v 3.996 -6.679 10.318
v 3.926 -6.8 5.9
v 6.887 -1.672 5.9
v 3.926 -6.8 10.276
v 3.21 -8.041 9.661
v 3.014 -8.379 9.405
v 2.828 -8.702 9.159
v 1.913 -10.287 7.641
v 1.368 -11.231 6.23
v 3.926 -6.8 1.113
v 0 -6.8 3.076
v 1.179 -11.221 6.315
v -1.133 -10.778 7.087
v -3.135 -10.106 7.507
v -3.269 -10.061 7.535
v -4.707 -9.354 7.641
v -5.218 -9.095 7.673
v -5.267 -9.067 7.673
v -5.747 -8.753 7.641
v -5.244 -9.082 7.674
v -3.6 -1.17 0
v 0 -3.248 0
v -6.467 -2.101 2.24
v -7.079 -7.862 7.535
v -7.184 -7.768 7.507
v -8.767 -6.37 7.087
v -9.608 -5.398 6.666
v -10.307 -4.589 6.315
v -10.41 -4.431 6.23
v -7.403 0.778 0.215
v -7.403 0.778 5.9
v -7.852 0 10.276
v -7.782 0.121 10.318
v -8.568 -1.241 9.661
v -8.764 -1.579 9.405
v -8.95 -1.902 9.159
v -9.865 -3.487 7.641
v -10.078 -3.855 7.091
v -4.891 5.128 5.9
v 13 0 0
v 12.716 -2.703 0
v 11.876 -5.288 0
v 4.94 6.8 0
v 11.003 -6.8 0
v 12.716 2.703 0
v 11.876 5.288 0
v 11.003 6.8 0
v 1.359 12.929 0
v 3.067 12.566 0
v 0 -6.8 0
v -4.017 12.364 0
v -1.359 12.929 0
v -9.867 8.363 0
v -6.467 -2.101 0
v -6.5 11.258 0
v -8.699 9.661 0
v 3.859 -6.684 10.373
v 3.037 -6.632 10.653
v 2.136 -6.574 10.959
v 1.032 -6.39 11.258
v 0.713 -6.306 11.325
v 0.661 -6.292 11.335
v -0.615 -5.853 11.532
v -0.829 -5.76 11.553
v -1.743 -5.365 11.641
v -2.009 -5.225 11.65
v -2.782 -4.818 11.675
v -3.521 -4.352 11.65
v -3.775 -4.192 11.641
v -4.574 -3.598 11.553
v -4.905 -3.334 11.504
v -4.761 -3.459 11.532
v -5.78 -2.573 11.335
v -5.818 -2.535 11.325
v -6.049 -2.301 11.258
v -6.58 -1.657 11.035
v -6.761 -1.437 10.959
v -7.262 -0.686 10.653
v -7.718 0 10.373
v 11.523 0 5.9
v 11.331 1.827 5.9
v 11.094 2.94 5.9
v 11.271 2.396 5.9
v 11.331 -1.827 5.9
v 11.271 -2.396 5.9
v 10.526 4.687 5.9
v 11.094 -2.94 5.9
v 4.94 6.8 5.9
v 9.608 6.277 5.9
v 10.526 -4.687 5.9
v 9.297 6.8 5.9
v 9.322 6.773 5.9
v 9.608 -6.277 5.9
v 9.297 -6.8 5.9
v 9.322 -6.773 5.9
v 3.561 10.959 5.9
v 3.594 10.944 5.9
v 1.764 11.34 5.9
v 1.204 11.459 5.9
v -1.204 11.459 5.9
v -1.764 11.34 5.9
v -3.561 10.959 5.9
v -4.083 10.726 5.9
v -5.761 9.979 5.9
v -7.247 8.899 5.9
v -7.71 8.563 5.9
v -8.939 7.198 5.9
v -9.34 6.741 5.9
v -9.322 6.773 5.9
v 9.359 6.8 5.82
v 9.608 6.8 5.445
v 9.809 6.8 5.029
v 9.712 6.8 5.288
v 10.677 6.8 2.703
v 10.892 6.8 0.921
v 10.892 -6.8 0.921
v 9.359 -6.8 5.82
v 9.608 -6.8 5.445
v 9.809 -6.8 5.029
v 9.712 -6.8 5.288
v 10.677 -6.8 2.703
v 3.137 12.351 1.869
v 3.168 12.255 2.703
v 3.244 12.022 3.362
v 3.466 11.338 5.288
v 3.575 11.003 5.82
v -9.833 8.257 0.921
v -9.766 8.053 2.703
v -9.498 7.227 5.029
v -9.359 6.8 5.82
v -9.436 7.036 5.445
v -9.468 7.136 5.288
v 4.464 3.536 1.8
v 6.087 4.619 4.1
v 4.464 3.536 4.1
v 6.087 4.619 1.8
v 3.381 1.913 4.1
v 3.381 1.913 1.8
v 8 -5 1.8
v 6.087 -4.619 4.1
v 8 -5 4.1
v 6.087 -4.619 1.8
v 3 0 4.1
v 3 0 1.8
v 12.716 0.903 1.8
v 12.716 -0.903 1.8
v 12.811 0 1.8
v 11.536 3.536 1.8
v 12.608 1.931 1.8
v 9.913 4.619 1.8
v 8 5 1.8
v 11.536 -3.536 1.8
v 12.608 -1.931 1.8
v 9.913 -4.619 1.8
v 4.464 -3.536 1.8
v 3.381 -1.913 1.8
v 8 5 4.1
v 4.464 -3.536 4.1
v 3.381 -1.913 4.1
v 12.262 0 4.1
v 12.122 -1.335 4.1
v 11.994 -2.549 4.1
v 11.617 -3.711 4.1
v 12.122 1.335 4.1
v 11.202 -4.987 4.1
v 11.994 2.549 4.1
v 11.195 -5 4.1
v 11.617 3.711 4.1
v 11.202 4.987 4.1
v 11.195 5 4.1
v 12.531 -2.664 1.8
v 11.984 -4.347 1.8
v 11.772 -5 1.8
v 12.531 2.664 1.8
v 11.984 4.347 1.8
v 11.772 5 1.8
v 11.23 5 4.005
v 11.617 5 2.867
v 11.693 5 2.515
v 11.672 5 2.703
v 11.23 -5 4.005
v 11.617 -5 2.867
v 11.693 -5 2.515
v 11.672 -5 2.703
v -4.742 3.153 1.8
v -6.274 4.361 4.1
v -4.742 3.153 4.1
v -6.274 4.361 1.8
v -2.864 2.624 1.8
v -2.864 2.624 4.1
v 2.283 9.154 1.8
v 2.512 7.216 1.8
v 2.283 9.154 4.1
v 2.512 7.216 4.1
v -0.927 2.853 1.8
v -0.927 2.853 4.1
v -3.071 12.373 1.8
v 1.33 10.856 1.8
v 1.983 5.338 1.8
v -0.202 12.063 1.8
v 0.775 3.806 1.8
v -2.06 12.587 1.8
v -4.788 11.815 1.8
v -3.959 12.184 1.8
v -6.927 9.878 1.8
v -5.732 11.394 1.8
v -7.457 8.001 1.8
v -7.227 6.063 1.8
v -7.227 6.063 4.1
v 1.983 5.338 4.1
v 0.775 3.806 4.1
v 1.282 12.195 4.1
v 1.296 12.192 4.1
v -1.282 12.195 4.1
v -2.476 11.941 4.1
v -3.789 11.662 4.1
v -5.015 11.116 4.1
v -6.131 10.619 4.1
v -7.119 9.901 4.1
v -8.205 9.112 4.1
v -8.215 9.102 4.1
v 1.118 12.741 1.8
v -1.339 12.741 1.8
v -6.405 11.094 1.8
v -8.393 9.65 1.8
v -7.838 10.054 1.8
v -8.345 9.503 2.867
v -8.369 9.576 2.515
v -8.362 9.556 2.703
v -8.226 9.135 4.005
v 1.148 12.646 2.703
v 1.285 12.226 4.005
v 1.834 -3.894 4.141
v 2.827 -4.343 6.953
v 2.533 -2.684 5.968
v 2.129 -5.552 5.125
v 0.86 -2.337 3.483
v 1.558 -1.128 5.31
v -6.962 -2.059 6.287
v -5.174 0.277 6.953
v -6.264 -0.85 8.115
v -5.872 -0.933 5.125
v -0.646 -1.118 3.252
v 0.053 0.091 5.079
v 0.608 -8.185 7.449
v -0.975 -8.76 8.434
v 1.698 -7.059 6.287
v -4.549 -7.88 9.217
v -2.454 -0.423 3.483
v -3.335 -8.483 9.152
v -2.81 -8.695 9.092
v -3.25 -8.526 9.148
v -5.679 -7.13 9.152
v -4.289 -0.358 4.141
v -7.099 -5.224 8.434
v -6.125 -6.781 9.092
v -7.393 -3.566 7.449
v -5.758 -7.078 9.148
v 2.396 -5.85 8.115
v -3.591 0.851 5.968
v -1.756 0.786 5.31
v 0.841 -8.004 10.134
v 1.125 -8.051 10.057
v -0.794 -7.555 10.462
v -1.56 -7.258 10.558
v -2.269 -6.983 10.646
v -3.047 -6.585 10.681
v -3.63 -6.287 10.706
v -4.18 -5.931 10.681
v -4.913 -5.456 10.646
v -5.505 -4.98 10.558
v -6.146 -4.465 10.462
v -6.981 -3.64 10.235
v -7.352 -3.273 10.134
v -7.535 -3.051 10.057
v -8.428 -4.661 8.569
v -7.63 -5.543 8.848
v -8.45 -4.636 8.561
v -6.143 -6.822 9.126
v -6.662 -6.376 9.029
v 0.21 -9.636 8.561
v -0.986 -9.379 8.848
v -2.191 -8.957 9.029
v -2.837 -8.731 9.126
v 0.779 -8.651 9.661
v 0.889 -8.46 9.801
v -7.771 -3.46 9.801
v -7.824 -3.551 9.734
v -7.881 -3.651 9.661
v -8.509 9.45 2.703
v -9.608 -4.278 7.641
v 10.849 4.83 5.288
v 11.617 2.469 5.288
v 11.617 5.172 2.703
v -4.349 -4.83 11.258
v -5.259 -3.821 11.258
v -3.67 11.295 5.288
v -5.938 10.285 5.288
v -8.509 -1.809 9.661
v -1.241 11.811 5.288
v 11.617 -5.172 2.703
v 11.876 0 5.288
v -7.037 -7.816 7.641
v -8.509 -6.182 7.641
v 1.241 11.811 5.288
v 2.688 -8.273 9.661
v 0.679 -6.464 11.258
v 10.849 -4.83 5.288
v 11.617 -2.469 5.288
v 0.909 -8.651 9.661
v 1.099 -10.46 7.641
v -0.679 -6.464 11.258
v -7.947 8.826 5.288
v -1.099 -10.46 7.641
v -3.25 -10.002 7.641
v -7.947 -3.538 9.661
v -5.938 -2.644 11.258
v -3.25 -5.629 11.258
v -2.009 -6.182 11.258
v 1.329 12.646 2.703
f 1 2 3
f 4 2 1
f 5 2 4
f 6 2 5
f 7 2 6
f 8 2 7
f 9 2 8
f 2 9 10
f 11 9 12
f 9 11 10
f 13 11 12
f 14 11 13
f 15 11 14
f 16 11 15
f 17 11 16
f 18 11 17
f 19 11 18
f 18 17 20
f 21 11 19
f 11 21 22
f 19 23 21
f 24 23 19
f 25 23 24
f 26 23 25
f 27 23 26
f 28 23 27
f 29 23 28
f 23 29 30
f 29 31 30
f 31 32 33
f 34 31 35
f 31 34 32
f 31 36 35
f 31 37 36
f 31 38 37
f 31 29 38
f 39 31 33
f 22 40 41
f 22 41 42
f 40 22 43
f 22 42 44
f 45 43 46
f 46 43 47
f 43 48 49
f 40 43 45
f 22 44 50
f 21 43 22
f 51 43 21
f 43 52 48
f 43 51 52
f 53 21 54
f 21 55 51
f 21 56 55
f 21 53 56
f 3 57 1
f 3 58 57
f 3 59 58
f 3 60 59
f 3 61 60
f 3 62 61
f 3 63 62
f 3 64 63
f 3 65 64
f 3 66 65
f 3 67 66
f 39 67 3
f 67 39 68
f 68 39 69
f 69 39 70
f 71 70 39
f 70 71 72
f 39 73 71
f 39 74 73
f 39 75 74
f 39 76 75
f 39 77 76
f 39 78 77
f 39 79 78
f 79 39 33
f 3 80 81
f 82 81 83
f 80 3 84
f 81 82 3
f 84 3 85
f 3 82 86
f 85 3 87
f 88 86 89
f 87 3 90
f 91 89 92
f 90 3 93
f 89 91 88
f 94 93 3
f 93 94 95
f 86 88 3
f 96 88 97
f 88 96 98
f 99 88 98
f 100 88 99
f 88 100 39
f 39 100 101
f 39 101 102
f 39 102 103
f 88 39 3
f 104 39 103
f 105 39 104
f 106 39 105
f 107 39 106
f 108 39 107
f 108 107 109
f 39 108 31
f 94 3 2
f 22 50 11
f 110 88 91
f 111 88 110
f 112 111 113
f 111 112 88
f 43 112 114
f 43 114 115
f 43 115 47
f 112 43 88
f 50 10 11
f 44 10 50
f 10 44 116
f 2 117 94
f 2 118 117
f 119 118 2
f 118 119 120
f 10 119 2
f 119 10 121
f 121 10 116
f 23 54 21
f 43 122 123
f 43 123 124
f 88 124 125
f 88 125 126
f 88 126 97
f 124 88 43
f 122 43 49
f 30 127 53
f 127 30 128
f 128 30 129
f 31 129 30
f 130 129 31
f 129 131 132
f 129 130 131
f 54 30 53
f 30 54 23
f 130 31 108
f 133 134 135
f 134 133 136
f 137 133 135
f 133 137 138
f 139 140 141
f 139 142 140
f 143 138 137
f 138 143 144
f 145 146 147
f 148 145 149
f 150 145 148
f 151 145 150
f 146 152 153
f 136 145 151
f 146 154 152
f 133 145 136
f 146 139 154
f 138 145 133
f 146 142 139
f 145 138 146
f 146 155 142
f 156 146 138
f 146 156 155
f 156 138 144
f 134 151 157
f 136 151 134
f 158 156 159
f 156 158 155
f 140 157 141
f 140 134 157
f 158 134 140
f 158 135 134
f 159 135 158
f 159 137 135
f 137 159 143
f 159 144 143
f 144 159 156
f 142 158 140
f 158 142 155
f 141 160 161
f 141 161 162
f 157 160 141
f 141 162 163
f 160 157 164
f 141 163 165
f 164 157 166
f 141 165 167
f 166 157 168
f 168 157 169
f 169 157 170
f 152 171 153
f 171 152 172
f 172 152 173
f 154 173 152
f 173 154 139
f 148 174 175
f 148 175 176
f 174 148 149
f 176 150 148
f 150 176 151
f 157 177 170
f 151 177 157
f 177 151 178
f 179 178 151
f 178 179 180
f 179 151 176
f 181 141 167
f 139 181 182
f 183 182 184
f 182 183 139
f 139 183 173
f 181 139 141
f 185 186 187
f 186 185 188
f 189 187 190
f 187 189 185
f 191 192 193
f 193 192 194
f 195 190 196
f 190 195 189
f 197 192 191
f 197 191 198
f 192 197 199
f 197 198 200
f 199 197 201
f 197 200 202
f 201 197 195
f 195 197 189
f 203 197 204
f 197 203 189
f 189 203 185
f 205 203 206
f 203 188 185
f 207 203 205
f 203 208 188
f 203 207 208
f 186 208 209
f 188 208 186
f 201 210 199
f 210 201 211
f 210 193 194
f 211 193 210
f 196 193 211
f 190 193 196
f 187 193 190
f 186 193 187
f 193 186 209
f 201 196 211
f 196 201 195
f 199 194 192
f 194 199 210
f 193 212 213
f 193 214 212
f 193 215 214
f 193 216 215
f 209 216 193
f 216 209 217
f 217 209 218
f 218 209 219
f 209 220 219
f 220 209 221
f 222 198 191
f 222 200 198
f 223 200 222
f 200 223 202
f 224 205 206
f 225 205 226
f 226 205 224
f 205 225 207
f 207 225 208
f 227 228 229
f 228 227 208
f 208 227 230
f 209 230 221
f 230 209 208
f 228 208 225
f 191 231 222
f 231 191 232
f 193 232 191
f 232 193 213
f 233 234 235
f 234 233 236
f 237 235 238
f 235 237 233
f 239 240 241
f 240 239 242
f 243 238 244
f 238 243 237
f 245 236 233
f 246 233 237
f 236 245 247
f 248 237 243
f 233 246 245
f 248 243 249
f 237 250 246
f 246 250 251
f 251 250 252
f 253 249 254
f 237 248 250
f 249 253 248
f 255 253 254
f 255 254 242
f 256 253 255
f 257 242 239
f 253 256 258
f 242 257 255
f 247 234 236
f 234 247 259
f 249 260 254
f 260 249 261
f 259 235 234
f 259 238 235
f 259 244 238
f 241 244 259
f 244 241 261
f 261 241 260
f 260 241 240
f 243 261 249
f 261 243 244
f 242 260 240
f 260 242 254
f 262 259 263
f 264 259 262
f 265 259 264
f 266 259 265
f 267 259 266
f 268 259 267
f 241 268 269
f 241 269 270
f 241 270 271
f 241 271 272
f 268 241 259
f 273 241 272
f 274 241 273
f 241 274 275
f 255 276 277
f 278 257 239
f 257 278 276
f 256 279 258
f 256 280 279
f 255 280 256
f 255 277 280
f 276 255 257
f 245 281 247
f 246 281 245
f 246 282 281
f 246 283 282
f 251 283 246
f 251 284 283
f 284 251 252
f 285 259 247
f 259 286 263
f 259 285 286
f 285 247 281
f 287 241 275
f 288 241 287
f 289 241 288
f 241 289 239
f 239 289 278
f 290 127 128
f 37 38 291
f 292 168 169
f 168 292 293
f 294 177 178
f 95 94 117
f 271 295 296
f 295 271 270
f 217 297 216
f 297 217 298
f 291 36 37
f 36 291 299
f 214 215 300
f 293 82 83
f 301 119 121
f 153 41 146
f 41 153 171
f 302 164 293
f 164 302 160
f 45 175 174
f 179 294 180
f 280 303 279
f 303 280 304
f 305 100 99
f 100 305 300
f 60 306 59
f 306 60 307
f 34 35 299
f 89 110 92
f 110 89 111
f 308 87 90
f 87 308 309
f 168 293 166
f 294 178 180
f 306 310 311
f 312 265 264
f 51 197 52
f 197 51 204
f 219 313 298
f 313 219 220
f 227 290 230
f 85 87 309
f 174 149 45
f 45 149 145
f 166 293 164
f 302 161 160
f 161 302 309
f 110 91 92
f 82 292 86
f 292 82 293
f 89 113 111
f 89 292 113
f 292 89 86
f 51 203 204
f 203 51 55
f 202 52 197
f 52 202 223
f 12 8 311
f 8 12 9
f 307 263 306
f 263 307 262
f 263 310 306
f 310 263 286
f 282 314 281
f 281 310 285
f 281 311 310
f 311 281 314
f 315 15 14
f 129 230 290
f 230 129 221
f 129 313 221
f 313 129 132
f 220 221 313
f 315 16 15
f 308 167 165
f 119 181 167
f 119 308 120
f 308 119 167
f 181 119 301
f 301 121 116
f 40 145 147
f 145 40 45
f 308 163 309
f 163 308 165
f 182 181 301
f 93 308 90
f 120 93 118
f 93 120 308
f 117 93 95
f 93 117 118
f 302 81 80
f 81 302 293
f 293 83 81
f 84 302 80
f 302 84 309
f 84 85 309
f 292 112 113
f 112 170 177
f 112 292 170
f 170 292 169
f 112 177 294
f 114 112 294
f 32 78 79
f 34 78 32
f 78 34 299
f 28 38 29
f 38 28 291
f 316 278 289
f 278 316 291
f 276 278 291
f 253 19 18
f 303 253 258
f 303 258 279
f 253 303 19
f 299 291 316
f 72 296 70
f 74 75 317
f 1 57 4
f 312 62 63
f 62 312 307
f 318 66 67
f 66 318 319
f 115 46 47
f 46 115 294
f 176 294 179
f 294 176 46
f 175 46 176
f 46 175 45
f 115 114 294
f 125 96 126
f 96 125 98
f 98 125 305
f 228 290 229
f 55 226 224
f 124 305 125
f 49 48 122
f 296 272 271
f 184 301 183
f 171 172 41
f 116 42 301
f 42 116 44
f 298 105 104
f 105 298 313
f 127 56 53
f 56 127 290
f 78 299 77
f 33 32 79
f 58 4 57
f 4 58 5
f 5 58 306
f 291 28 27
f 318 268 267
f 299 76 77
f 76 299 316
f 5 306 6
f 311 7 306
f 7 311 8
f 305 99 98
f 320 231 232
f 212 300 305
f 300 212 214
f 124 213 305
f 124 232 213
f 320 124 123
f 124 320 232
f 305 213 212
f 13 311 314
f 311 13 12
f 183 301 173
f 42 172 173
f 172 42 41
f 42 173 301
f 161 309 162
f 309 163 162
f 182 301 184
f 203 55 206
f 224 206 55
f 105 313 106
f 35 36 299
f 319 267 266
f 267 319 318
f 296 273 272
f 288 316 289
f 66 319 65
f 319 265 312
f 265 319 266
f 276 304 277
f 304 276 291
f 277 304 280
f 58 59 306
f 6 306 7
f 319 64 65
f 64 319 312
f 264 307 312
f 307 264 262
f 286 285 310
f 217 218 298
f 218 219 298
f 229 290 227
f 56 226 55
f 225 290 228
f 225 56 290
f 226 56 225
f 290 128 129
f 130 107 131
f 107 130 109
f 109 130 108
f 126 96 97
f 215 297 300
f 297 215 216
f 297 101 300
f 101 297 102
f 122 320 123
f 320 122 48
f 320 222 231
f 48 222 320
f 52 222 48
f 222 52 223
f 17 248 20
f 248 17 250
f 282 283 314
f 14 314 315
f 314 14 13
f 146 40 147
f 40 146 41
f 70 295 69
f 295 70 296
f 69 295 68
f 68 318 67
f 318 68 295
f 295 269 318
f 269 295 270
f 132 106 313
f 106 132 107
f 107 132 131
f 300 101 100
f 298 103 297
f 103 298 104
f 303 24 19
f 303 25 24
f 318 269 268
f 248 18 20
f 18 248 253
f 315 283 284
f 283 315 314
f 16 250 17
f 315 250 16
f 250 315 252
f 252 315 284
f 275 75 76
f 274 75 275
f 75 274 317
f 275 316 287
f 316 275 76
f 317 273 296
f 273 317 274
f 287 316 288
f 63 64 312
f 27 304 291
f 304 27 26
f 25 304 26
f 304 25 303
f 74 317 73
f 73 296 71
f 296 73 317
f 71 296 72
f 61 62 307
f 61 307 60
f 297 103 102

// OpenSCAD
module hedronVertex(translation, angle1, angle2){
	translate(translation){
		children(0);
	}
	rotate(angle1){
		translate(translation){
			children(1);
		}
	}
	rotate(angle2){
		translate(translation){
			children(2);
		}
	}
}

module popsicleStick() {

	l=119;
	w=10;
	h=2.3;

	union() {
        translate([0,0,-h/2]){
            cylinder(h=h,r=w/2);
            translate(v=[l-w/2,0,-h/2]){
                cylinder(h=h,r=w/2);
            }
        }
		translate(v=[0,-w/2,-h/2]){
			cube(size=[l-w/2,w,h]);
		}
	}
}

module popsicleSocket(angle){
	l=15;
	stickW=10;
	stickH=2.3;
	wall=1.8;
	w = stickW+2*wall;
	h = stickH+2*wall;
    
	//translate(v=[0,-w/2,-h/2]){
        minOverhangCube([l,w,h], angle, 45);
	//}
}

module minOverhangCube(cubeSize, angle, minOverhangAngle){    

    trianglePoint0 = [0, 0];
    trianglePoint1 = [cos(-angle)*cubeSize[0], sin(-angle)*cubeSize[0]];
    trianglePoint2 = [trianglePoint1[0]-(tan(minOverhangAngle)*trianglePoint1[1]), 0];
    
    translate([0, -cubeSize[1]/2, 0]){
        translate([0, cubeSize[1], 0]){
            rotate([90, 0, 0]){
                linear_extrude(height = cubeSize[1]){
                polygon(points = [trianglePoint0, trianglePoint1, trianglePoint2]);
                }
            }
        }

        rotate([0, angle, 0]){
            cube(cubeSize);
        }
    }
}


//popsicleSocket();
intersection(){
    sphere(13);
difference()
{
    
hedronVertex([0, 0, 0], [0, 0, 108], [0, 0, -120]){
	popsicleSocket(0);
	popsicleSocket(0);
	popsicleSocket(-37.38);
}

hedronVertex([8, 0, 2.95], [0, 0, 108], [0, -37.38, -120])
{
	popsicleStick();
	popsicleStick();
	popsicleStick();
}
}

}
